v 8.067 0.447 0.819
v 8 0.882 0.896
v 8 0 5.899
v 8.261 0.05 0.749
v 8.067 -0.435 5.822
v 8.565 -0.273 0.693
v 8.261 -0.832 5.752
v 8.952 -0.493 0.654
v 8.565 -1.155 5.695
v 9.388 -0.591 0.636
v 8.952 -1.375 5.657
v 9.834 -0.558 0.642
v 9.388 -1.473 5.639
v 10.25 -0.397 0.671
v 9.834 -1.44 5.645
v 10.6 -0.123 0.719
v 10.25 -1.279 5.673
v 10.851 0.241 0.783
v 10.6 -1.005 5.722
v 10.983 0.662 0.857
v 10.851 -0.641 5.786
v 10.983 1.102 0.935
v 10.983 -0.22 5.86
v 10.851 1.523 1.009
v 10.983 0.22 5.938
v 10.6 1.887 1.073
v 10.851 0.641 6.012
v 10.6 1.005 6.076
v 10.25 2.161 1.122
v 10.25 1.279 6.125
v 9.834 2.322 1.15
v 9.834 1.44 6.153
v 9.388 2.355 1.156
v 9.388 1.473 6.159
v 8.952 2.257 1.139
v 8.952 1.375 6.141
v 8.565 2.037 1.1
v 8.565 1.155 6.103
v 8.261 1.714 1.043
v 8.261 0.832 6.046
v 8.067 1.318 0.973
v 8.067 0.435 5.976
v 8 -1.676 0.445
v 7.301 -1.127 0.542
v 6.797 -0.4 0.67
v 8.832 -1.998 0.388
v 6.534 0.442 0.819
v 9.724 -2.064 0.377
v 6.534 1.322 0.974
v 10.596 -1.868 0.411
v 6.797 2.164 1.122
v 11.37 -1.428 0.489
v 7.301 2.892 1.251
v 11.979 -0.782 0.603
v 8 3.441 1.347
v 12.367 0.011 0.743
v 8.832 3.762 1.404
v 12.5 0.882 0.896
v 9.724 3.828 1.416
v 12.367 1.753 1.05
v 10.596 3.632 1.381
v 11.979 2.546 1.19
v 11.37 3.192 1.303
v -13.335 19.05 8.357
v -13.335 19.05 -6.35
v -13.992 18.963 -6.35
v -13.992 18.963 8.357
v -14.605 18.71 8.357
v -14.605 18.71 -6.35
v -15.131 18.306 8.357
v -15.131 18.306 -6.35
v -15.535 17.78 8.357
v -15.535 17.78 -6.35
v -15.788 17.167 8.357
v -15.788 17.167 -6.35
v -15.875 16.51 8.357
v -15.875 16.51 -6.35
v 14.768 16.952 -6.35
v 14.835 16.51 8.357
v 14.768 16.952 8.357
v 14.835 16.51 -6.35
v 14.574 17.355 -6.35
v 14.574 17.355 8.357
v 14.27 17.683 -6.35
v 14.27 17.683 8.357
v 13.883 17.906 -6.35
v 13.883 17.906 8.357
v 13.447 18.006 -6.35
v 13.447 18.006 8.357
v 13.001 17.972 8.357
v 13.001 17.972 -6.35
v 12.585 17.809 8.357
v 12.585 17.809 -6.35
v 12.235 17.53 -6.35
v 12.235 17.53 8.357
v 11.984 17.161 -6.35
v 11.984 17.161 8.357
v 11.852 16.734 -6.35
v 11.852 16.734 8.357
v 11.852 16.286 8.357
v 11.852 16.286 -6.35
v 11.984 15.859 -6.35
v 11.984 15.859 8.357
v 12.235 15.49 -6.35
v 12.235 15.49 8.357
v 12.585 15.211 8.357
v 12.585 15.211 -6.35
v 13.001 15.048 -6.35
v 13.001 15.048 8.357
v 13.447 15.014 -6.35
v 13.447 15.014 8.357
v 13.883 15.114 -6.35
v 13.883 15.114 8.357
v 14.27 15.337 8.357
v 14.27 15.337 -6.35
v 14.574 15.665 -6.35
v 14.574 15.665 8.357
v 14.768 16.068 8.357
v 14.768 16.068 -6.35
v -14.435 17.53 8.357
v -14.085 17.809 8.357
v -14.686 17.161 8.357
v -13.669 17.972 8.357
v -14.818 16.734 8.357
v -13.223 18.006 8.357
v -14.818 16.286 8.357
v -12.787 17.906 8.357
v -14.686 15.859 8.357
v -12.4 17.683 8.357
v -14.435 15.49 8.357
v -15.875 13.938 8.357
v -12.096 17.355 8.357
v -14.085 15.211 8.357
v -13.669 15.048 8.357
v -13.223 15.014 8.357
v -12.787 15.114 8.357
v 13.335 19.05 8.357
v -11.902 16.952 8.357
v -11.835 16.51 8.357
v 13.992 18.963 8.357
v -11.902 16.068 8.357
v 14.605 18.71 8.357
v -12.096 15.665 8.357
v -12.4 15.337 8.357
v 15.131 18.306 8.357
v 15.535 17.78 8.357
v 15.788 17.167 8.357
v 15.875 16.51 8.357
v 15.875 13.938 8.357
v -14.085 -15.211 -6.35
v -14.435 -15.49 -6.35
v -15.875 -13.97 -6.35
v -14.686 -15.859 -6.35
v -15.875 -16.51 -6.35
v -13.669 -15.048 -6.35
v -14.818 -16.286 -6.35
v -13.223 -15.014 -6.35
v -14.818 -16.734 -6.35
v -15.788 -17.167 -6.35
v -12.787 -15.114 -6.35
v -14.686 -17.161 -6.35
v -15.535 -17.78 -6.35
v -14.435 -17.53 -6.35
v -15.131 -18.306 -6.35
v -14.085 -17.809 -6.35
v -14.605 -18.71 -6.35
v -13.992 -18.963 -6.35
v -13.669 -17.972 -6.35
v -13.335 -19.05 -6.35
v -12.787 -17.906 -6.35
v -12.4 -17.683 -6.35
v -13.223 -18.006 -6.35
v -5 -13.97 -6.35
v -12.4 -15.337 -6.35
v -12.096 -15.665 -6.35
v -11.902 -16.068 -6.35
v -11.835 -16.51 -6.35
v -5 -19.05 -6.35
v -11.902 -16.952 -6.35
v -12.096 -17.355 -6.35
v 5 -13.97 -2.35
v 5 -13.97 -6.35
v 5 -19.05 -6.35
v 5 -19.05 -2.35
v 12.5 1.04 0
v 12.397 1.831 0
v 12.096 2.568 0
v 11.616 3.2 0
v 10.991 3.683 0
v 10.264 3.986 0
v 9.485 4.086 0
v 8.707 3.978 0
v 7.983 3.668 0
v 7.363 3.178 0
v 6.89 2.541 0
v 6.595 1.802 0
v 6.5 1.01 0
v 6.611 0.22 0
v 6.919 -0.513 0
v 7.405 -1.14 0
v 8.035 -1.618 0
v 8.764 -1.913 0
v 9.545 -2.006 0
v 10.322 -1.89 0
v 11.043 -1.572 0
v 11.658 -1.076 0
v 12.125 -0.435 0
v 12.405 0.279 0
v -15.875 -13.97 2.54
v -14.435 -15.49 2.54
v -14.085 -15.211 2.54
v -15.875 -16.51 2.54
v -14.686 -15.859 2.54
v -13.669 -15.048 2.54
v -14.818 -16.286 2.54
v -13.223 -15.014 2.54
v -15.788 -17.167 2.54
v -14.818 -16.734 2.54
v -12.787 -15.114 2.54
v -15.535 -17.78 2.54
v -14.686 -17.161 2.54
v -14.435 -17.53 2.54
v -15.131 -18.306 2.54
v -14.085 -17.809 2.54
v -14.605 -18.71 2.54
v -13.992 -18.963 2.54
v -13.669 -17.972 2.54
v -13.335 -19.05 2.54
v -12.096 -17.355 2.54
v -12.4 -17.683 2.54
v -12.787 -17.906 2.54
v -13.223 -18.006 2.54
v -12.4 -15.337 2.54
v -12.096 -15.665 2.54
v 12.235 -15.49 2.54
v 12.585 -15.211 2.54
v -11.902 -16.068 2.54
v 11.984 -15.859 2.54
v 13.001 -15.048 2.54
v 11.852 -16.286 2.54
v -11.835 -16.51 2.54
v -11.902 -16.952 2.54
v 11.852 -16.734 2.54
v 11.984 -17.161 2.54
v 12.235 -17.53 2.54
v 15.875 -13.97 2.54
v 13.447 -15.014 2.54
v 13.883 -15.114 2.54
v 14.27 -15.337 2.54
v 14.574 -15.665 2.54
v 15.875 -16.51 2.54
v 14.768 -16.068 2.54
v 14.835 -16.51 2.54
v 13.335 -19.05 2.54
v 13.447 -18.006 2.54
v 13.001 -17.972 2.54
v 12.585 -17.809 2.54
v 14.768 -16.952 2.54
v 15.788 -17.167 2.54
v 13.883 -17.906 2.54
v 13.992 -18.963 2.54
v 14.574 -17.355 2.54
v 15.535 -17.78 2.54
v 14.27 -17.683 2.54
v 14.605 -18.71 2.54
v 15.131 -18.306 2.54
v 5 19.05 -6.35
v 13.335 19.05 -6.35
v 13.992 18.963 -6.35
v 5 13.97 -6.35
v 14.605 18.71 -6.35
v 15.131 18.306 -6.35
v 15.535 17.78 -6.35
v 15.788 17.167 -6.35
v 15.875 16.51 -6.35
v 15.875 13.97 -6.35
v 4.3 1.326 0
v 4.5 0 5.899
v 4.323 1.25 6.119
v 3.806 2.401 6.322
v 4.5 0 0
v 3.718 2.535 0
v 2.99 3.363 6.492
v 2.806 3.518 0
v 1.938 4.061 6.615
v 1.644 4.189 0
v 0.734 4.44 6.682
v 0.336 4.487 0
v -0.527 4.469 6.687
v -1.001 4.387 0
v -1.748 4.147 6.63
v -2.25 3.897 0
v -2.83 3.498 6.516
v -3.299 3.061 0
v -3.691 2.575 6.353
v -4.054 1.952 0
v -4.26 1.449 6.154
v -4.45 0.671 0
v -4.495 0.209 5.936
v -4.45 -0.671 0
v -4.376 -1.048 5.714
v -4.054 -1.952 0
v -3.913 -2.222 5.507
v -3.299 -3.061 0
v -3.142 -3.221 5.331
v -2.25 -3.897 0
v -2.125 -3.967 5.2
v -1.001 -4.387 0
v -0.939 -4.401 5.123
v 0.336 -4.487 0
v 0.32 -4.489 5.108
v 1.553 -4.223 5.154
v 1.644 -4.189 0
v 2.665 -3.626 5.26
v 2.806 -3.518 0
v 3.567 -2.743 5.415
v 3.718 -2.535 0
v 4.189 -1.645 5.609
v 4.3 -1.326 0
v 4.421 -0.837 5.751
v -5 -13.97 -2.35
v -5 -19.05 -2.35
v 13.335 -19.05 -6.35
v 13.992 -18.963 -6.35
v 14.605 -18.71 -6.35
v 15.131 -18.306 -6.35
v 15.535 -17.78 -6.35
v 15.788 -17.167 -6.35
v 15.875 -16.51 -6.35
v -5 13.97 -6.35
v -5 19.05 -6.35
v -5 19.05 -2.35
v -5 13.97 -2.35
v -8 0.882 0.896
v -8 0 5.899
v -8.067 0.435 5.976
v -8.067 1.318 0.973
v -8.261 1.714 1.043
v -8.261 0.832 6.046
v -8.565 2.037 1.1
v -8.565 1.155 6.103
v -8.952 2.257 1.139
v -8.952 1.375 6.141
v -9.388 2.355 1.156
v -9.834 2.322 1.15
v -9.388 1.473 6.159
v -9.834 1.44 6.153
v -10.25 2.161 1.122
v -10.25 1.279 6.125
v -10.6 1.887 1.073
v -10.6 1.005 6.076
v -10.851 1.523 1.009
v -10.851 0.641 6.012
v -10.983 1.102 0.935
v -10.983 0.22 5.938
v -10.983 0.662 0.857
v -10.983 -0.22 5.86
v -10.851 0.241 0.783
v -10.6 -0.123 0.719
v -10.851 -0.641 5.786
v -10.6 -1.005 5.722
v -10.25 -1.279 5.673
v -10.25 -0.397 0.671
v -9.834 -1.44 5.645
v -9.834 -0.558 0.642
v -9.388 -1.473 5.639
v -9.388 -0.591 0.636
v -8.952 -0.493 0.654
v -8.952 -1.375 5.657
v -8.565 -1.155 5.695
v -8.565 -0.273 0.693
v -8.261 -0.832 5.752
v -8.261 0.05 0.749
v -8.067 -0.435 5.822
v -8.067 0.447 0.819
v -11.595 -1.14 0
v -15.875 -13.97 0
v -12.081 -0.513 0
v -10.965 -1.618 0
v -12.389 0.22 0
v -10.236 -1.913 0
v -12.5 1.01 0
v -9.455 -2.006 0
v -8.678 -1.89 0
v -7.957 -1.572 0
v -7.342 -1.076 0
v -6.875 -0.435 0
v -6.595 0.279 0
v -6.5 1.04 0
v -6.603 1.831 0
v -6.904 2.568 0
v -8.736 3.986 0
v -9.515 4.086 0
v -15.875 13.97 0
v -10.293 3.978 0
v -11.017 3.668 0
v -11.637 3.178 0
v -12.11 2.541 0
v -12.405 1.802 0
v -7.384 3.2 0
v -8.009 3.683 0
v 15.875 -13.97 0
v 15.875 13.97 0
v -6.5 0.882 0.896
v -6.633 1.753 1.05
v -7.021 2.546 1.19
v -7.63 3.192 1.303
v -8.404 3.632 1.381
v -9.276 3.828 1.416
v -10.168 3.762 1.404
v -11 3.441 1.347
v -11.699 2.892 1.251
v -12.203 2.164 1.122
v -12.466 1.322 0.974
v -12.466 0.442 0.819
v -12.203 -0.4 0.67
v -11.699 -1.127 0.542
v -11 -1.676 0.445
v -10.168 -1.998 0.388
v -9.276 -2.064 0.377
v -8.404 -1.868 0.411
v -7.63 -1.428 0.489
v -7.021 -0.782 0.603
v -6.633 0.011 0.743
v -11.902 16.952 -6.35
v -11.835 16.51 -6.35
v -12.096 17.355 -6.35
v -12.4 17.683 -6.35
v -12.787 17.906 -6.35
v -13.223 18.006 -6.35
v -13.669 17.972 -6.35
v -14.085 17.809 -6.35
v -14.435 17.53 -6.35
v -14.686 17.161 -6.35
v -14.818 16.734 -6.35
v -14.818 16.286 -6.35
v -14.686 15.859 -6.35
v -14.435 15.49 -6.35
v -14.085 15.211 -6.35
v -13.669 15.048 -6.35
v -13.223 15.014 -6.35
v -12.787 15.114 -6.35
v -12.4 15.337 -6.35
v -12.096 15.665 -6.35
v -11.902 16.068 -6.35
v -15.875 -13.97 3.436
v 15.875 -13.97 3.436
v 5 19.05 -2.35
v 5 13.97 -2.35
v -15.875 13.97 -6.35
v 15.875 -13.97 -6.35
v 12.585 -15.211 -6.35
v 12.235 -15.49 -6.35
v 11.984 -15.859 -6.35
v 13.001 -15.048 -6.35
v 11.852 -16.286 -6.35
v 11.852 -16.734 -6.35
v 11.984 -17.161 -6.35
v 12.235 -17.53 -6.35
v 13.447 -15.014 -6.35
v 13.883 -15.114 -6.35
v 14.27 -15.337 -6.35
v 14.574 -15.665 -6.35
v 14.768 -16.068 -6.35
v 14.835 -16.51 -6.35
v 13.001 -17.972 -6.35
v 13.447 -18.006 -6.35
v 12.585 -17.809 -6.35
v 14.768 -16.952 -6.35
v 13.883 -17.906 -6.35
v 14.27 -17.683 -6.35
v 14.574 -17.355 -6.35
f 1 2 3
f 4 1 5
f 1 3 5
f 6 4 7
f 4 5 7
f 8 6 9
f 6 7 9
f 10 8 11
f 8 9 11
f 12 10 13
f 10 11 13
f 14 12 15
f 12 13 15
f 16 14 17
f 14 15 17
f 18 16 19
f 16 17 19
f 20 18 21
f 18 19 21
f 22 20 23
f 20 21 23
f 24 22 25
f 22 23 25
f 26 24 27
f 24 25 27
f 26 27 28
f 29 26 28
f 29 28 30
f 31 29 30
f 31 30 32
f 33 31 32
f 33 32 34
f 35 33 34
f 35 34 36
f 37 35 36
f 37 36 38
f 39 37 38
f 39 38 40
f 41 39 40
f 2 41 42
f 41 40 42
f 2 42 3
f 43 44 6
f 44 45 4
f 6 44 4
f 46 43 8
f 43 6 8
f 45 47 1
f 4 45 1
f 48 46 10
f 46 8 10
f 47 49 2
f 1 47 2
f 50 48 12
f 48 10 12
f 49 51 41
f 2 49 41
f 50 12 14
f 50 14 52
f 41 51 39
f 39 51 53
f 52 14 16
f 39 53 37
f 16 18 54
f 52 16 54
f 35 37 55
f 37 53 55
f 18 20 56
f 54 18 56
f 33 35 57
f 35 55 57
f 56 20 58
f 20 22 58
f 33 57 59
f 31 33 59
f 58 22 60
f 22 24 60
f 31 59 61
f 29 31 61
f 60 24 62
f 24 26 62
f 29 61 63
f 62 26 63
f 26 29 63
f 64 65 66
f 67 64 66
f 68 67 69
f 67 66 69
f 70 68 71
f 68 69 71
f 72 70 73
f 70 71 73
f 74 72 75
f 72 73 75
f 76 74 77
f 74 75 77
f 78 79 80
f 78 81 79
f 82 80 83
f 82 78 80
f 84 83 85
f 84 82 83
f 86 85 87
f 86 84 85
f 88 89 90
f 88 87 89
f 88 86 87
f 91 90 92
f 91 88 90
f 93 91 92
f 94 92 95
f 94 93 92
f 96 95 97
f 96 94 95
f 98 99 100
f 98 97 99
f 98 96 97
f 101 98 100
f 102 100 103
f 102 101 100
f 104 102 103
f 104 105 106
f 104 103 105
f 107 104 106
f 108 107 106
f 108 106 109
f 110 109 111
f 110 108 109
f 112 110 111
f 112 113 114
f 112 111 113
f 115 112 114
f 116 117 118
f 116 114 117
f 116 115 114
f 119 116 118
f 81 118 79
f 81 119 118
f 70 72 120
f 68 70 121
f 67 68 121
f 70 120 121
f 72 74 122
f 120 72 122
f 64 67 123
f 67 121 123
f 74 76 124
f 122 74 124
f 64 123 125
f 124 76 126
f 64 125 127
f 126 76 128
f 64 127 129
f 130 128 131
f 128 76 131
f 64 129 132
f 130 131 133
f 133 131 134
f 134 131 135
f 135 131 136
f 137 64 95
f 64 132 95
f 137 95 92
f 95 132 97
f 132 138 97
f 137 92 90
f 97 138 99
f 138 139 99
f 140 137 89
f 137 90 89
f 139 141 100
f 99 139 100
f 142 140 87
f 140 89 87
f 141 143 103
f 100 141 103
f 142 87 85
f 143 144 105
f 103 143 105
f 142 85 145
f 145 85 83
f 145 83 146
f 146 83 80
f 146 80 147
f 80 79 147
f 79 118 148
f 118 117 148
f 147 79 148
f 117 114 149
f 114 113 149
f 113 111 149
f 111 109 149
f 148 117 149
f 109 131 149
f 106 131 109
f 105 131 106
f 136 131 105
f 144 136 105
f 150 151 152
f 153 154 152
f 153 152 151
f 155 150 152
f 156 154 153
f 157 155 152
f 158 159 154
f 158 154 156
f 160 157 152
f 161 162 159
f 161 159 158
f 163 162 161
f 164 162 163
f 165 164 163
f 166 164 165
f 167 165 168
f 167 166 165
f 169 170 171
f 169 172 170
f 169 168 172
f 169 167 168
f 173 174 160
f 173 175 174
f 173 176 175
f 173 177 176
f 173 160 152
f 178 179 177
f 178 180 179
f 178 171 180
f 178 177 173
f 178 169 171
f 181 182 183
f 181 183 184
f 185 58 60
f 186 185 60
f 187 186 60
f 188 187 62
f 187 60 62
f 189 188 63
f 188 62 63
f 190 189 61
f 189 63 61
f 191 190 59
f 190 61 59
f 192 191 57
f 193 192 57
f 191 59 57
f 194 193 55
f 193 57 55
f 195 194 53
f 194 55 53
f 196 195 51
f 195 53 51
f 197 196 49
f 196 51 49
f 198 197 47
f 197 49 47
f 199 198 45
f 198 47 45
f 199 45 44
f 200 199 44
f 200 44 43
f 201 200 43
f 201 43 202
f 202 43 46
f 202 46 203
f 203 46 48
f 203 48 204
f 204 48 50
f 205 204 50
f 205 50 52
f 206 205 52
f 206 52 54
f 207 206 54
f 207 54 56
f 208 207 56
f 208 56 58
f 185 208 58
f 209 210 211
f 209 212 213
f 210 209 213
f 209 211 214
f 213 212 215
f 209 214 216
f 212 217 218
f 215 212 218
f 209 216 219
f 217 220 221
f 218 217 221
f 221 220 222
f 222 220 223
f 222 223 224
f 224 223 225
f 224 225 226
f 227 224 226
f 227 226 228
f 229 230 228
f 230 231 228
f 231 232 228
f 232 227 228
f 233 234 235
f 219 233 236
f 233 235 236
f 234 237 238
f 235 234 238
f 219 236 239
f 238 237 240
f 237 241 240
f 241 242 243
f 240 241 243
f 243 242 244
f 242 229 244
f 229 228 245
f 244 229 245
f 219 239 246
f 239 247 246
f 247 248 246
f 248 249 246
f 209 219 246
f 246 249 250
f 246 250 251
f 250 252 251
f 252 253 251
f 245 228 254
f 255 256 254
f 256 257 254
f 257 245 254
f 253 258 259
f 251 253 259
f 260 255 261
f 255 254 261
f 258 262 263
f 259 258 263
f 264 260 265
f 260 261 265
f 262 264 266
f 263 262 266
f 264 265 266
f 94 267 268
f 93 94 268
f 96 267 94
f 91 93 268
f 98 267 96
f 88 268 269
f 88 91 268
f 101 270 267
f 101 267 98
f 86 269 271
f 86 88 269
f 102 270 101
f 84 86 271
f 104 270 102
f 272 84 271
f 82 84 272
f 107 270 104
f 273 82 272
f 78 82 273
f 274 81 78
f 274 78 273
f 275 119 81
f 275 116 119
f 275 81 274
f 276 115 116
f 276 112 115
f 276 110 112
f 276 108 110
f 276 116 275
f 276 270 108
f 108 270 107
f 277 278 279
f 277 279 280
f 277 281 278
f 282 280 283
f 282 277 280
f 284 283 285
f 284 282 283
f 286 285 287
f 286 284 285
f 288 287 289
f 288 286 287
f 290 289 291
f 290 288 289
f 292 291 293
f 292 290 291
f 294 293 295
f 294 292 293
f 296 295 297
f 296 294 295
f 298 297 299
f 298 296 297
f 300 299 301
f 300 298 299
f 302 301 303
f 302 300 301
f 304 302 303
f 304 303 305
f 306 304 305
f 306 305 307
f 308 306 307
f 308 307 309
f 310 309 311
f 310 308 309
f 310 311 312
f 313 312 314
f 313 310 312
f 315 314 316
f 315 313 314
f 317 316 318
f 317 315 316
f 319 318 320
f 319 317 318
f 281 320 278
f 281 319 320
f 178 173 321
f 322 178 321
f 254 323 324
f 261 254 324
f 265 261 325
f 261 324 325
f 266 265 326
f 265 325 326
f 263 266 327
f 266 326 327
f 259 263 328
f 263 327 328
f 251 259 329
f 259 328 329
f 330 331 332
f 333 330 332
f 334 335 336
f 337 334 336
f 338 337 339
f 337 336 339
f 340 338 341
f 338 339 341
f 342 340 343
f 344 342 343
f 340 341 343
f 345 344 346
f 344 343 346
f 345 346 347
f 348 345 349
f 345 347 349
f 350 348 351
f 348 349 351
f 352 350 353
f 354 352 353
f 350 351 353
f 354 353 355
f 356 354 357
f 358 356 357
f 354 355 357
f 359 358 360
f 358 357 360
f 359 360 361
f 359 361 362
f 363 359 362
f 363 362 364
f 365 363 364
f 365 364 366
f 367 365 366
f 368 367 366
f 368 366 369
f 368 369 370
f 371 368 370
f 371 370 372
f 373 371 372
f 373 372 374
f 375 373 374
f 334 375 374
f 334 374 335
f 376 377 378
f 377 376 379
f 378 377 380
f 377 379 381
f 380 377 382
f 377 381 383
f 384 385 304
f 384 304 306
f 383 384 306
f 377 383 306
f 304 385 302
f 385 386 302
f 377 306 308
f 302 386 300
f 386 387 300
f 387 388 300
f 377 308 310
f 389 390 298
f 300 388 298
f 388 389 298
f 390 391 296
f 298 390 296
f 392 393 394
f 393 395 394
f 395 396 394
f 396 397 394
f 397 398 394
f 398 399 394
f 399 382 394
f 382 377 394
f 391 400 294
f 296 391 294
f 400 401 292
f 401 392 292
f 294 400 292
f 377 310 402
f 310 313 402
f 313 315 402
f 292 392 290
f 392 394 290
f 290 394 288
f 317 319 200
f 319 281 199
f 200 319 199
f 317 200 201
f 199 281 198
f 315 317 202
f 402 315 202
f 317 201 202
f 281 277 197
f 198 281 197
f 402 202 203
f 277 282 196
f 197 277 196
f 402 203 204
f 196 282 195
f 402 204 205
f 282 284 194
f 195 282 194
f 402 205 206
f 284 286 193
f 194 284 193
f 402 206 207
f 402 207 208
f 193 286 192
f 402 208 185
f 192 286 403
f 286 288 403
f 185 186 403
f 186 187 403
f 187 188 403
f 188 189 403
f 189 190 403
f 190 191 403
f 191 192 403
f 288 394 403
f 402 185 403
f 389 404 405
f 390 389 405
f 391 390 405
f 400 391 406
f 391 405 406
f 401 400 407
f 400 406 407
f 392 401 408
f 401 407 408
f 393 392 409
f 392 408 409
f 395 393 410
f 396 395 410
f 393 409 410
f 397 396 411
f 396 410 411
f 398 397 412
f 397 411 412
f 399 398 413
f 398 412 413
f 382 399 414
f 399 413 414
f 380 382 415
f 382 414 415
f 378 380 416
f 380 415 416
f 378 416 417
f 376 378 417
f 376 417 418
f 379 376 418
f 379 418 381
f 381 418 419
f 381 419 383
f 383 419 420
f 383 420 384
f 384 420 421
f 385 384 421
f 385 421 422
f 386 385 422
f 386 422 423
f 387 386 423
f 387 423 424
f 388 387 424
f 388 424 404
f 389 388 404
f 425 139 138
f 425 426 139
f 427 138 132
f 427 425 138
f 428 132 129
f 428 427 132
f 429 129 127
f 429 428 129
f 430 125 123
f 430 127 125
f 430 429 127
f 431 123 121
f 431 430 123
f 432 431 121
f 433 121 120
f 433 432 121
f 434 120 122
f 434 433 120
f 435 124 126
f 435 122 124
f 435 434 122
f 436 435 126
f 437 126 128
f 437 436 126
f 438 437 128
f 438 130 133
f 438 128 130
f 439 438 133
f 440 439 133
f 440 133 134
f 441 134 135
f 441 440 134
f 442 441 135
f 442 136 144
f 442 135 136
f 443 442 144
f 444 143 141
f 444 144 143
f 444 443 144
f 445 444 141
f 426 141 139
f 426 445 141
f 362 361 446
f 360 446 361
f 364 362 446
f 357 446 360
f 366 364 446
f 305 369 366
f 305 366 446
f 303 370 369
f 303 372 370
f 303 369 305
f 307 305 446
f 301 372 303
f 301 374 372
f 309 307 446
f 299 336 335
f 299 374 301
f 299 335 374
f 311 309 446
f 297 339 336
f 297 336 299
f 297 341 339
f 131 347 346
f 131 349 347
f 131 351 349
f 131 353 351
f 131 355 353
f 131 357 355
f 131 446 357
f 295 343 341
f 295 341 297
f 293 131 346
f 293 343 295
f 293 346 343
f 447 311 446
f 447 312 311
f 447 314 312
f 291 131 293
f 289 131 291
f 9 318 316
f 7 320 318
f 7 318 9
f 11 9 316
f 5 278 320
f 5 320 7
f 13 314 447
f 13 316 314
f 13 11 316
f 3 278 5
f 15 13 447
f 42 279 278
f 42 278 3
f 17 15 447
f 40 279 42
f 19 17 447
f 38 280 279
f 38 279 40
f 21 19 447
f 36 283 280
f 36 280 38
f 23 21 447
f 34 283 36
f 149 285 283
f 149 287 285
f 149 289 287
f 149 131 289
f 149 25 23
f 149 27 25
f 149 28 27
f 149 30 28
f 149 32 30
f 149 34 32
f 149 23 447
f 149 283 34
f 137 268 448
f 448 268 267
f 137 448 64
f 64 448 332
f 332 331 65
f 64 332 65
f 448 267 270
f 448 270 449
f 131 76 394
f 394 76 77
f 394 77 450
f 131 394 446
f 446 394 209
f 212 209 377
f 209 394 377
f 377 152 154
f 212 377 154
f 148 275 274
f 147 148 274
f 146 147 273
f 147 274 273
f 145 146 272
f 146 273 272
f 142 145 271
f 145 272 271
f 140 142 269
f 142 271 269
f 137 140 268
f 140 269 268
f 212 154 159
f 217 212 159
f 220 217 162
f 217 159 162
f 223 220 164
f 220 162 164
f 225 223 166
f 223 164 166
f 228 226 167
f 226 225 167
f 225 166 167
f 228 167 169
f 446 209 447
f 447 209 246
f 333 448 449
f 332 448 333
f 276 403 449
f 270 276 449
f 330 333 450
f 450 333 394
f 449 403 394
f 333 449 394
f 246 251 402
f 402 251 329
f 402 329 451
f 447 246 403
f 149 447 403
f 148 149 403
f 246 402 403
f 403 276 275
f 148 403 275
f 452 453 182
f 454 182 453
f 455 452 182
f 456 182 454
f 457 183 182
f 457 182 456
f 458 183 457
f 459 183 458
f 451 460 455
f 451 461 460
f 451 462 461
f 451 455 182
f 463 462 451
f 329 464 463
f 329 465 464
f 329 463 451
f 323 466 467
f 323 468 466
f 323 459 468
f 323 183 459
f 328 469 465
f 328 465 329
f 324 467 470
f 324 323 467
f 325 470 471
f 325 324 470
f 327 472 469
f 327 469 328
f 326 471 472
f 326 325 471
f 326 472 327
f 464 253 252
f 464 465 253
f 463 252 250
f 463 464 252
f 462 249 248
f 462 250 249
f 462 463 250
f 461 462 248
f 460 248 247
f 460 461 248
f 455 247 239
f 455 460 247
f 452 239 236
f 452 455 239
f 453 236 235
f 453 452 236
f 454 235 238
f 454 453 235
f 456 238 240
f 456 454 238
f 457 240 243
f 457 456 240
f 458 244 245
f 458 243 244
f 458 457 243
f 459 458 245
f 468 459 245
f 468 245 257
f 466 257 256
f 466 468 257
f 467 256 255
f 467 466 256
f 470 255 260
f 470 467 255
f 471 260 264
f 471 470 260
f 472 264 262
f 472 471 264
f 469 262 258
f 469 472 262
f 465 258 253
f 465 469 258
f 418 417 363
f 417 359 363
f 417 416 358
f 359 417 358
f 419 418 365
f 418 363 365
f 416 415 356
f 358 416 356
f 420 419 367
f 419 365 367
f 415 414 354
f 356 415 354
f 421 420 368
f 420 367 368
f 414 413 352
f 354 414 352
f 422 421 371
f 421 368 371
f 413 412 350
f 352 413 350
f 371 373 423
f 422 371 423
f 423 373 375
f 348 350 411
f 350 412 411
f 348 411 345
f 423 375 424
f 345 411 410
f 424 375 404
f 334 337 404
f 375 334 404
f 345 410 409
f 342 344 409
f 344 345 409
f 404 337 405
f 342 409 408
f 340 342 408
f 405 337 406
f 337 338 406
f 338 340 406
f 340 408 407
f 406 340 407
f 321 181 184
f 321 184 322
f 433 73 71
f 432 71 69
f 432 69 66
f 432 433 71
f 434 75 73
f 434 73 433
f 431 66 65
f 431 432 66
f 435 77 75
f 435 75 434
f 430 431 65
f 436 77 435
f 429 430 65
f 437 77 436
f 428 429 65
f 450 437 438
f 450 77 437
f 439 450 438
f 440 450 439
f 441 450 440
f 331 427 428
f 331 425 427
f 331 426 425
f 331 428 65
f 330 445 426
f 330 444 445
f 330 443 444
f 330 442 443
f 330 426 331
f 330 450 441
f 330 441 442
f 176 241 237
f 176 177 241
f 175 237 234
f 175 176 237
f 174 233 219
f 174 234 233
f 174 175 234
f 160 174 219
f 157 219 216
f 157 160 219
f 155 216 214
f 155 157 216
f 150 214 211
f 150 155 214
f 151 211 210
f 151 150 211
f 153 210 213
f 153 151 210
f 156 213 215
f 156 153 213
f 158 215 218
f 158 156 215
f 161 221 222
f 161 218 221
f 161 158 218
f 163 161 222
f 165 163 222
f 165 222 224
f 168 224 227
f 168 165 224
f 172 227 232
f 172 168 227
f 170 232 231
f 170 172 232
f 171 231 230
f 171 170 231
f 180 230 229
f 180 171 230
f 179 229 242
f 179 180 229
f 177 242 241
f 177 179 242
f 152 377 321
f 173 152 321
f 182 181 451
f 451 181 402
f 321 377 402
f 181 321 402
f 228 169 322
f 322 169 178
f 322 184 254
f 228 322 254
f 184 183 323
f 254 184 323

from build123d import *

# Parameters (mm, degrees)
F0_R      = 1.5
F0_R_2    = 4.5
F1_DEPTH  = 2.54
F2_R      = 1.5
F3_DEPTH  = 6.35
F4_W      = 10
F4_H      = 4
F5_DEPTH  = 38.101
F7_DEPTH  = 25.4
F8_W      = 51.0473959148
F8_H      = 75.9243667126
F9_DEPTH  = 25.4
F11_W     = 50.7149714977
F11_H     = 15.4611356556
F12_DEPTH = 25.4
F14_W     = 45.2918484807
F14_H     = 5.08
F15_DEPTH = 25.4
F16_R     = 1.5
F17_DEPTH = 25.4
F19_R     = 3
F19_R_2   = 1.5
F20_DEPTH = 25.4


with BuildPart() as f1:
    # F0 (on Top) → F1 (new body)
    with BuildSketch(Plane.XY):
        with BuildLine():
            ThreePointArc((15.875, 16.51), (15.1310512242, 18.3060512242), (13.335, 19.05))
            Line((13.335, 19.05), (-13.335, 19.05))
            ThreePointArc((-13.335, 19.05), (-15.1310512242, 18.3060512242), (-15.875, 16.51))
            Line((-15.875, 16.51), (-15.875, -16.51))
            ThreePointArc((-15.875, -16.51), (-15.1310512242, -18.3060512242), (-13.335, -19.05))
            Line((-13.335, -19.05), (13.335, -19.05))
            ThreePointArc((13.335, -19.05), (15.1310512242, -18.3060512242), (15.875, -16.51))
            Line((15.875, -16.51), (15.875, 16.51))
        make_face()
        with Locations((-13.335, -16.51)):
            Circle(F0_R, mode=Mode.SUBTRACT)
        with Locations((13.335, -16.51)):
            Circle(F0_R, mode=Mode.SUBTRACT)
        with Locations((-13.335, 16.51)):
            Circle(F0_R, mode=Mode.SUBTRACT)
        Circle(F0_R_2, mode=Mode.SUBTRACT)
        with Locations((13.335, 16.51)):
            Circle(F0_R, mode=Mode.SUBTRACT)
    extrude(amount=F1_DEPTH)

    # F2 (on face) → F3 (join)
    with BuildSketch(Plane(origin=(0, 0, 0), x_dir=(1, 0, 0), z_dir=(0, 0, -1))):
        with BuildLine():
            Line((-15.875, 16.51), (-15.875, 13.97))
            Line((-15.875, 13.97), (15.875, 13.97))
            Line((15.875, 13.97), (15.875, 16.51))
            ThreePointArc((15.875, 16.51), (15.1310512242, 18.3060512242), (13.335, 19.05))
            Line((13.335, 19.05), (-13.335, 19.05))
            ThreePointArc((-13.335, 19.05), (-15.1310512242, 18.3060512242), (-15.875, 16.51))
        make_face()
        with Locations((-13.335, 16.51)):
            Circle(F2_R, mode=Mode.SUBTRACT)
        with Locations((13.335, 16.51)):
            Circle(F2_R, mode=Mode.SUBTRACT)
        with BuildLine():
            Line((15.875, -13.97), (-15.875, -13.97))
            Line((-15.875, -13.97), (-15.875, -16.51))
            ThreePointArc((-15.875, -16.51), (-15.1310512242, -18.3060512242), (-13.335, -19.05))
            Line((-13.335, -19.05), (13.335, -19.05))
            ThreePointArc((13.335, -19.05), (15.1310512242, -18.3060512242), (15.875, -16.51))
            Line((15.875, -16.51), (15.875, -13.97))
        make_face()
        with Locations((-13.335, -16.51)):
            Circle(F2_R, mode=Mode.SUBTRACT)
        with Locations((13.335, -16.51)):
            Circle(F2_R, mode=Mode.SUBTRACT)
    extrude(amount=F3_DEPTH)

    # F4 (on face) → F5 (cut, through all)
    with BuildSketch(Plane(origin=(0, 19.05, 0), x_dir=(-1, 0, 0), z_dir=(0, 1, 0))):
        with Locations((0, -4.35)):
            Rectangle(F4_W, F4_H)
    extrude(amount=-F5_DEPTH, mode=Mode.SUBTRACT)

    # F7 (add): a face of the model
    f7_faces = [f1.faces().sort_by_distance(p)[0] for p in [
        (14.7803610119, 17.9553610119, 2.54),
    ]]
    extrude(f7_faces, amount=F7_DEPTH)

    # F8 (on face) → F9 (cut)
    with BuildSketch(Plane(origin=(0, -1.008793369, 5.7211514936), x_dir=(1, 0, 0), z_dir=(0, -0.1736481777, 0.984807753))):
        with Locations((4.5789629221, 5.4835118353)):
            Rectangle(F8_W, F8_H)
    extrude(amount=F9_DEPTH, mode=Mode.SUBTRACT)

    # F11 (on offset) → F12 (cut)
    with BuildSketch(Plane(origin=(0, 0, 8.3566), x_dir=(1, 0, 0), z_dir=(0, 0, -1))):
        with Locations((4.4036144391, -15.0017738342)):
            Rectangle(F11_W, F11_H)
    extrude(amount=-F12_DEPTH, mode=Mode.SUBTRACT)

    # F14 (on offset) → F15 (cut)
    with BuildSketch(Plane(origin=(0, 0, 2.54), x_dir=(1, 0, 0), z_dir=(0, 0, -1))):
        with Locations((0.4216730595, 16.51)):
            Rectangle(F14_W, F14_H)
    extrude(amount=-F15_DEPTH, mode=Mode.SUBTRACT)

    # F16 (on face) → F17 (cut)
    with BuildSketch(Plane(origin=(0, -1.008793369, 5.7211514936), x_dir=(1, 0, 0), z_dir=(0, -0.1736481777, 0.984807753))):
        with Locations((-9.5, 1.0243556328)):
            Circle(F16_R)
        with BuildLine():
            ThreePointArc((11, 1.0243556328), (9.5, 2.5243556328), (8, 1.0243556328))
            ThreePointArc((8, 1.0243556328), (9.5, -0.4756443672), (11, 1.0243556328))
        make_face()
    extrude(amount=-F17_DEPTH, mode=Mode.SUBTRACT)

    # F19 (on offset) → F20 (cut)
    with BuildSketch(Plane(origin=(0, -0.1266606265, 0.7183281083), x_dir=(1, 0, 0), z_dir=(0, -0.1736481777, 0.984807753))):
        with Locations((9.5, 1.0243556328)):
            Circle(F19_R)
        with Locations((9.5, 1.0243556328)):
            Circle(F19_R_2, mode=Mode.SUBTRACT)
        with Locations((-9.5, 1.0243556328)):
            Circle(F19_R)
        with Locations((-9.5, 1.0243556328)):
            Circle(F19_R_2, mode=Mode.SUBTRACT)
    extrude(amount=-F20_DEPTH, mode=Mode.SUBTRACT)


solid = f1.part
